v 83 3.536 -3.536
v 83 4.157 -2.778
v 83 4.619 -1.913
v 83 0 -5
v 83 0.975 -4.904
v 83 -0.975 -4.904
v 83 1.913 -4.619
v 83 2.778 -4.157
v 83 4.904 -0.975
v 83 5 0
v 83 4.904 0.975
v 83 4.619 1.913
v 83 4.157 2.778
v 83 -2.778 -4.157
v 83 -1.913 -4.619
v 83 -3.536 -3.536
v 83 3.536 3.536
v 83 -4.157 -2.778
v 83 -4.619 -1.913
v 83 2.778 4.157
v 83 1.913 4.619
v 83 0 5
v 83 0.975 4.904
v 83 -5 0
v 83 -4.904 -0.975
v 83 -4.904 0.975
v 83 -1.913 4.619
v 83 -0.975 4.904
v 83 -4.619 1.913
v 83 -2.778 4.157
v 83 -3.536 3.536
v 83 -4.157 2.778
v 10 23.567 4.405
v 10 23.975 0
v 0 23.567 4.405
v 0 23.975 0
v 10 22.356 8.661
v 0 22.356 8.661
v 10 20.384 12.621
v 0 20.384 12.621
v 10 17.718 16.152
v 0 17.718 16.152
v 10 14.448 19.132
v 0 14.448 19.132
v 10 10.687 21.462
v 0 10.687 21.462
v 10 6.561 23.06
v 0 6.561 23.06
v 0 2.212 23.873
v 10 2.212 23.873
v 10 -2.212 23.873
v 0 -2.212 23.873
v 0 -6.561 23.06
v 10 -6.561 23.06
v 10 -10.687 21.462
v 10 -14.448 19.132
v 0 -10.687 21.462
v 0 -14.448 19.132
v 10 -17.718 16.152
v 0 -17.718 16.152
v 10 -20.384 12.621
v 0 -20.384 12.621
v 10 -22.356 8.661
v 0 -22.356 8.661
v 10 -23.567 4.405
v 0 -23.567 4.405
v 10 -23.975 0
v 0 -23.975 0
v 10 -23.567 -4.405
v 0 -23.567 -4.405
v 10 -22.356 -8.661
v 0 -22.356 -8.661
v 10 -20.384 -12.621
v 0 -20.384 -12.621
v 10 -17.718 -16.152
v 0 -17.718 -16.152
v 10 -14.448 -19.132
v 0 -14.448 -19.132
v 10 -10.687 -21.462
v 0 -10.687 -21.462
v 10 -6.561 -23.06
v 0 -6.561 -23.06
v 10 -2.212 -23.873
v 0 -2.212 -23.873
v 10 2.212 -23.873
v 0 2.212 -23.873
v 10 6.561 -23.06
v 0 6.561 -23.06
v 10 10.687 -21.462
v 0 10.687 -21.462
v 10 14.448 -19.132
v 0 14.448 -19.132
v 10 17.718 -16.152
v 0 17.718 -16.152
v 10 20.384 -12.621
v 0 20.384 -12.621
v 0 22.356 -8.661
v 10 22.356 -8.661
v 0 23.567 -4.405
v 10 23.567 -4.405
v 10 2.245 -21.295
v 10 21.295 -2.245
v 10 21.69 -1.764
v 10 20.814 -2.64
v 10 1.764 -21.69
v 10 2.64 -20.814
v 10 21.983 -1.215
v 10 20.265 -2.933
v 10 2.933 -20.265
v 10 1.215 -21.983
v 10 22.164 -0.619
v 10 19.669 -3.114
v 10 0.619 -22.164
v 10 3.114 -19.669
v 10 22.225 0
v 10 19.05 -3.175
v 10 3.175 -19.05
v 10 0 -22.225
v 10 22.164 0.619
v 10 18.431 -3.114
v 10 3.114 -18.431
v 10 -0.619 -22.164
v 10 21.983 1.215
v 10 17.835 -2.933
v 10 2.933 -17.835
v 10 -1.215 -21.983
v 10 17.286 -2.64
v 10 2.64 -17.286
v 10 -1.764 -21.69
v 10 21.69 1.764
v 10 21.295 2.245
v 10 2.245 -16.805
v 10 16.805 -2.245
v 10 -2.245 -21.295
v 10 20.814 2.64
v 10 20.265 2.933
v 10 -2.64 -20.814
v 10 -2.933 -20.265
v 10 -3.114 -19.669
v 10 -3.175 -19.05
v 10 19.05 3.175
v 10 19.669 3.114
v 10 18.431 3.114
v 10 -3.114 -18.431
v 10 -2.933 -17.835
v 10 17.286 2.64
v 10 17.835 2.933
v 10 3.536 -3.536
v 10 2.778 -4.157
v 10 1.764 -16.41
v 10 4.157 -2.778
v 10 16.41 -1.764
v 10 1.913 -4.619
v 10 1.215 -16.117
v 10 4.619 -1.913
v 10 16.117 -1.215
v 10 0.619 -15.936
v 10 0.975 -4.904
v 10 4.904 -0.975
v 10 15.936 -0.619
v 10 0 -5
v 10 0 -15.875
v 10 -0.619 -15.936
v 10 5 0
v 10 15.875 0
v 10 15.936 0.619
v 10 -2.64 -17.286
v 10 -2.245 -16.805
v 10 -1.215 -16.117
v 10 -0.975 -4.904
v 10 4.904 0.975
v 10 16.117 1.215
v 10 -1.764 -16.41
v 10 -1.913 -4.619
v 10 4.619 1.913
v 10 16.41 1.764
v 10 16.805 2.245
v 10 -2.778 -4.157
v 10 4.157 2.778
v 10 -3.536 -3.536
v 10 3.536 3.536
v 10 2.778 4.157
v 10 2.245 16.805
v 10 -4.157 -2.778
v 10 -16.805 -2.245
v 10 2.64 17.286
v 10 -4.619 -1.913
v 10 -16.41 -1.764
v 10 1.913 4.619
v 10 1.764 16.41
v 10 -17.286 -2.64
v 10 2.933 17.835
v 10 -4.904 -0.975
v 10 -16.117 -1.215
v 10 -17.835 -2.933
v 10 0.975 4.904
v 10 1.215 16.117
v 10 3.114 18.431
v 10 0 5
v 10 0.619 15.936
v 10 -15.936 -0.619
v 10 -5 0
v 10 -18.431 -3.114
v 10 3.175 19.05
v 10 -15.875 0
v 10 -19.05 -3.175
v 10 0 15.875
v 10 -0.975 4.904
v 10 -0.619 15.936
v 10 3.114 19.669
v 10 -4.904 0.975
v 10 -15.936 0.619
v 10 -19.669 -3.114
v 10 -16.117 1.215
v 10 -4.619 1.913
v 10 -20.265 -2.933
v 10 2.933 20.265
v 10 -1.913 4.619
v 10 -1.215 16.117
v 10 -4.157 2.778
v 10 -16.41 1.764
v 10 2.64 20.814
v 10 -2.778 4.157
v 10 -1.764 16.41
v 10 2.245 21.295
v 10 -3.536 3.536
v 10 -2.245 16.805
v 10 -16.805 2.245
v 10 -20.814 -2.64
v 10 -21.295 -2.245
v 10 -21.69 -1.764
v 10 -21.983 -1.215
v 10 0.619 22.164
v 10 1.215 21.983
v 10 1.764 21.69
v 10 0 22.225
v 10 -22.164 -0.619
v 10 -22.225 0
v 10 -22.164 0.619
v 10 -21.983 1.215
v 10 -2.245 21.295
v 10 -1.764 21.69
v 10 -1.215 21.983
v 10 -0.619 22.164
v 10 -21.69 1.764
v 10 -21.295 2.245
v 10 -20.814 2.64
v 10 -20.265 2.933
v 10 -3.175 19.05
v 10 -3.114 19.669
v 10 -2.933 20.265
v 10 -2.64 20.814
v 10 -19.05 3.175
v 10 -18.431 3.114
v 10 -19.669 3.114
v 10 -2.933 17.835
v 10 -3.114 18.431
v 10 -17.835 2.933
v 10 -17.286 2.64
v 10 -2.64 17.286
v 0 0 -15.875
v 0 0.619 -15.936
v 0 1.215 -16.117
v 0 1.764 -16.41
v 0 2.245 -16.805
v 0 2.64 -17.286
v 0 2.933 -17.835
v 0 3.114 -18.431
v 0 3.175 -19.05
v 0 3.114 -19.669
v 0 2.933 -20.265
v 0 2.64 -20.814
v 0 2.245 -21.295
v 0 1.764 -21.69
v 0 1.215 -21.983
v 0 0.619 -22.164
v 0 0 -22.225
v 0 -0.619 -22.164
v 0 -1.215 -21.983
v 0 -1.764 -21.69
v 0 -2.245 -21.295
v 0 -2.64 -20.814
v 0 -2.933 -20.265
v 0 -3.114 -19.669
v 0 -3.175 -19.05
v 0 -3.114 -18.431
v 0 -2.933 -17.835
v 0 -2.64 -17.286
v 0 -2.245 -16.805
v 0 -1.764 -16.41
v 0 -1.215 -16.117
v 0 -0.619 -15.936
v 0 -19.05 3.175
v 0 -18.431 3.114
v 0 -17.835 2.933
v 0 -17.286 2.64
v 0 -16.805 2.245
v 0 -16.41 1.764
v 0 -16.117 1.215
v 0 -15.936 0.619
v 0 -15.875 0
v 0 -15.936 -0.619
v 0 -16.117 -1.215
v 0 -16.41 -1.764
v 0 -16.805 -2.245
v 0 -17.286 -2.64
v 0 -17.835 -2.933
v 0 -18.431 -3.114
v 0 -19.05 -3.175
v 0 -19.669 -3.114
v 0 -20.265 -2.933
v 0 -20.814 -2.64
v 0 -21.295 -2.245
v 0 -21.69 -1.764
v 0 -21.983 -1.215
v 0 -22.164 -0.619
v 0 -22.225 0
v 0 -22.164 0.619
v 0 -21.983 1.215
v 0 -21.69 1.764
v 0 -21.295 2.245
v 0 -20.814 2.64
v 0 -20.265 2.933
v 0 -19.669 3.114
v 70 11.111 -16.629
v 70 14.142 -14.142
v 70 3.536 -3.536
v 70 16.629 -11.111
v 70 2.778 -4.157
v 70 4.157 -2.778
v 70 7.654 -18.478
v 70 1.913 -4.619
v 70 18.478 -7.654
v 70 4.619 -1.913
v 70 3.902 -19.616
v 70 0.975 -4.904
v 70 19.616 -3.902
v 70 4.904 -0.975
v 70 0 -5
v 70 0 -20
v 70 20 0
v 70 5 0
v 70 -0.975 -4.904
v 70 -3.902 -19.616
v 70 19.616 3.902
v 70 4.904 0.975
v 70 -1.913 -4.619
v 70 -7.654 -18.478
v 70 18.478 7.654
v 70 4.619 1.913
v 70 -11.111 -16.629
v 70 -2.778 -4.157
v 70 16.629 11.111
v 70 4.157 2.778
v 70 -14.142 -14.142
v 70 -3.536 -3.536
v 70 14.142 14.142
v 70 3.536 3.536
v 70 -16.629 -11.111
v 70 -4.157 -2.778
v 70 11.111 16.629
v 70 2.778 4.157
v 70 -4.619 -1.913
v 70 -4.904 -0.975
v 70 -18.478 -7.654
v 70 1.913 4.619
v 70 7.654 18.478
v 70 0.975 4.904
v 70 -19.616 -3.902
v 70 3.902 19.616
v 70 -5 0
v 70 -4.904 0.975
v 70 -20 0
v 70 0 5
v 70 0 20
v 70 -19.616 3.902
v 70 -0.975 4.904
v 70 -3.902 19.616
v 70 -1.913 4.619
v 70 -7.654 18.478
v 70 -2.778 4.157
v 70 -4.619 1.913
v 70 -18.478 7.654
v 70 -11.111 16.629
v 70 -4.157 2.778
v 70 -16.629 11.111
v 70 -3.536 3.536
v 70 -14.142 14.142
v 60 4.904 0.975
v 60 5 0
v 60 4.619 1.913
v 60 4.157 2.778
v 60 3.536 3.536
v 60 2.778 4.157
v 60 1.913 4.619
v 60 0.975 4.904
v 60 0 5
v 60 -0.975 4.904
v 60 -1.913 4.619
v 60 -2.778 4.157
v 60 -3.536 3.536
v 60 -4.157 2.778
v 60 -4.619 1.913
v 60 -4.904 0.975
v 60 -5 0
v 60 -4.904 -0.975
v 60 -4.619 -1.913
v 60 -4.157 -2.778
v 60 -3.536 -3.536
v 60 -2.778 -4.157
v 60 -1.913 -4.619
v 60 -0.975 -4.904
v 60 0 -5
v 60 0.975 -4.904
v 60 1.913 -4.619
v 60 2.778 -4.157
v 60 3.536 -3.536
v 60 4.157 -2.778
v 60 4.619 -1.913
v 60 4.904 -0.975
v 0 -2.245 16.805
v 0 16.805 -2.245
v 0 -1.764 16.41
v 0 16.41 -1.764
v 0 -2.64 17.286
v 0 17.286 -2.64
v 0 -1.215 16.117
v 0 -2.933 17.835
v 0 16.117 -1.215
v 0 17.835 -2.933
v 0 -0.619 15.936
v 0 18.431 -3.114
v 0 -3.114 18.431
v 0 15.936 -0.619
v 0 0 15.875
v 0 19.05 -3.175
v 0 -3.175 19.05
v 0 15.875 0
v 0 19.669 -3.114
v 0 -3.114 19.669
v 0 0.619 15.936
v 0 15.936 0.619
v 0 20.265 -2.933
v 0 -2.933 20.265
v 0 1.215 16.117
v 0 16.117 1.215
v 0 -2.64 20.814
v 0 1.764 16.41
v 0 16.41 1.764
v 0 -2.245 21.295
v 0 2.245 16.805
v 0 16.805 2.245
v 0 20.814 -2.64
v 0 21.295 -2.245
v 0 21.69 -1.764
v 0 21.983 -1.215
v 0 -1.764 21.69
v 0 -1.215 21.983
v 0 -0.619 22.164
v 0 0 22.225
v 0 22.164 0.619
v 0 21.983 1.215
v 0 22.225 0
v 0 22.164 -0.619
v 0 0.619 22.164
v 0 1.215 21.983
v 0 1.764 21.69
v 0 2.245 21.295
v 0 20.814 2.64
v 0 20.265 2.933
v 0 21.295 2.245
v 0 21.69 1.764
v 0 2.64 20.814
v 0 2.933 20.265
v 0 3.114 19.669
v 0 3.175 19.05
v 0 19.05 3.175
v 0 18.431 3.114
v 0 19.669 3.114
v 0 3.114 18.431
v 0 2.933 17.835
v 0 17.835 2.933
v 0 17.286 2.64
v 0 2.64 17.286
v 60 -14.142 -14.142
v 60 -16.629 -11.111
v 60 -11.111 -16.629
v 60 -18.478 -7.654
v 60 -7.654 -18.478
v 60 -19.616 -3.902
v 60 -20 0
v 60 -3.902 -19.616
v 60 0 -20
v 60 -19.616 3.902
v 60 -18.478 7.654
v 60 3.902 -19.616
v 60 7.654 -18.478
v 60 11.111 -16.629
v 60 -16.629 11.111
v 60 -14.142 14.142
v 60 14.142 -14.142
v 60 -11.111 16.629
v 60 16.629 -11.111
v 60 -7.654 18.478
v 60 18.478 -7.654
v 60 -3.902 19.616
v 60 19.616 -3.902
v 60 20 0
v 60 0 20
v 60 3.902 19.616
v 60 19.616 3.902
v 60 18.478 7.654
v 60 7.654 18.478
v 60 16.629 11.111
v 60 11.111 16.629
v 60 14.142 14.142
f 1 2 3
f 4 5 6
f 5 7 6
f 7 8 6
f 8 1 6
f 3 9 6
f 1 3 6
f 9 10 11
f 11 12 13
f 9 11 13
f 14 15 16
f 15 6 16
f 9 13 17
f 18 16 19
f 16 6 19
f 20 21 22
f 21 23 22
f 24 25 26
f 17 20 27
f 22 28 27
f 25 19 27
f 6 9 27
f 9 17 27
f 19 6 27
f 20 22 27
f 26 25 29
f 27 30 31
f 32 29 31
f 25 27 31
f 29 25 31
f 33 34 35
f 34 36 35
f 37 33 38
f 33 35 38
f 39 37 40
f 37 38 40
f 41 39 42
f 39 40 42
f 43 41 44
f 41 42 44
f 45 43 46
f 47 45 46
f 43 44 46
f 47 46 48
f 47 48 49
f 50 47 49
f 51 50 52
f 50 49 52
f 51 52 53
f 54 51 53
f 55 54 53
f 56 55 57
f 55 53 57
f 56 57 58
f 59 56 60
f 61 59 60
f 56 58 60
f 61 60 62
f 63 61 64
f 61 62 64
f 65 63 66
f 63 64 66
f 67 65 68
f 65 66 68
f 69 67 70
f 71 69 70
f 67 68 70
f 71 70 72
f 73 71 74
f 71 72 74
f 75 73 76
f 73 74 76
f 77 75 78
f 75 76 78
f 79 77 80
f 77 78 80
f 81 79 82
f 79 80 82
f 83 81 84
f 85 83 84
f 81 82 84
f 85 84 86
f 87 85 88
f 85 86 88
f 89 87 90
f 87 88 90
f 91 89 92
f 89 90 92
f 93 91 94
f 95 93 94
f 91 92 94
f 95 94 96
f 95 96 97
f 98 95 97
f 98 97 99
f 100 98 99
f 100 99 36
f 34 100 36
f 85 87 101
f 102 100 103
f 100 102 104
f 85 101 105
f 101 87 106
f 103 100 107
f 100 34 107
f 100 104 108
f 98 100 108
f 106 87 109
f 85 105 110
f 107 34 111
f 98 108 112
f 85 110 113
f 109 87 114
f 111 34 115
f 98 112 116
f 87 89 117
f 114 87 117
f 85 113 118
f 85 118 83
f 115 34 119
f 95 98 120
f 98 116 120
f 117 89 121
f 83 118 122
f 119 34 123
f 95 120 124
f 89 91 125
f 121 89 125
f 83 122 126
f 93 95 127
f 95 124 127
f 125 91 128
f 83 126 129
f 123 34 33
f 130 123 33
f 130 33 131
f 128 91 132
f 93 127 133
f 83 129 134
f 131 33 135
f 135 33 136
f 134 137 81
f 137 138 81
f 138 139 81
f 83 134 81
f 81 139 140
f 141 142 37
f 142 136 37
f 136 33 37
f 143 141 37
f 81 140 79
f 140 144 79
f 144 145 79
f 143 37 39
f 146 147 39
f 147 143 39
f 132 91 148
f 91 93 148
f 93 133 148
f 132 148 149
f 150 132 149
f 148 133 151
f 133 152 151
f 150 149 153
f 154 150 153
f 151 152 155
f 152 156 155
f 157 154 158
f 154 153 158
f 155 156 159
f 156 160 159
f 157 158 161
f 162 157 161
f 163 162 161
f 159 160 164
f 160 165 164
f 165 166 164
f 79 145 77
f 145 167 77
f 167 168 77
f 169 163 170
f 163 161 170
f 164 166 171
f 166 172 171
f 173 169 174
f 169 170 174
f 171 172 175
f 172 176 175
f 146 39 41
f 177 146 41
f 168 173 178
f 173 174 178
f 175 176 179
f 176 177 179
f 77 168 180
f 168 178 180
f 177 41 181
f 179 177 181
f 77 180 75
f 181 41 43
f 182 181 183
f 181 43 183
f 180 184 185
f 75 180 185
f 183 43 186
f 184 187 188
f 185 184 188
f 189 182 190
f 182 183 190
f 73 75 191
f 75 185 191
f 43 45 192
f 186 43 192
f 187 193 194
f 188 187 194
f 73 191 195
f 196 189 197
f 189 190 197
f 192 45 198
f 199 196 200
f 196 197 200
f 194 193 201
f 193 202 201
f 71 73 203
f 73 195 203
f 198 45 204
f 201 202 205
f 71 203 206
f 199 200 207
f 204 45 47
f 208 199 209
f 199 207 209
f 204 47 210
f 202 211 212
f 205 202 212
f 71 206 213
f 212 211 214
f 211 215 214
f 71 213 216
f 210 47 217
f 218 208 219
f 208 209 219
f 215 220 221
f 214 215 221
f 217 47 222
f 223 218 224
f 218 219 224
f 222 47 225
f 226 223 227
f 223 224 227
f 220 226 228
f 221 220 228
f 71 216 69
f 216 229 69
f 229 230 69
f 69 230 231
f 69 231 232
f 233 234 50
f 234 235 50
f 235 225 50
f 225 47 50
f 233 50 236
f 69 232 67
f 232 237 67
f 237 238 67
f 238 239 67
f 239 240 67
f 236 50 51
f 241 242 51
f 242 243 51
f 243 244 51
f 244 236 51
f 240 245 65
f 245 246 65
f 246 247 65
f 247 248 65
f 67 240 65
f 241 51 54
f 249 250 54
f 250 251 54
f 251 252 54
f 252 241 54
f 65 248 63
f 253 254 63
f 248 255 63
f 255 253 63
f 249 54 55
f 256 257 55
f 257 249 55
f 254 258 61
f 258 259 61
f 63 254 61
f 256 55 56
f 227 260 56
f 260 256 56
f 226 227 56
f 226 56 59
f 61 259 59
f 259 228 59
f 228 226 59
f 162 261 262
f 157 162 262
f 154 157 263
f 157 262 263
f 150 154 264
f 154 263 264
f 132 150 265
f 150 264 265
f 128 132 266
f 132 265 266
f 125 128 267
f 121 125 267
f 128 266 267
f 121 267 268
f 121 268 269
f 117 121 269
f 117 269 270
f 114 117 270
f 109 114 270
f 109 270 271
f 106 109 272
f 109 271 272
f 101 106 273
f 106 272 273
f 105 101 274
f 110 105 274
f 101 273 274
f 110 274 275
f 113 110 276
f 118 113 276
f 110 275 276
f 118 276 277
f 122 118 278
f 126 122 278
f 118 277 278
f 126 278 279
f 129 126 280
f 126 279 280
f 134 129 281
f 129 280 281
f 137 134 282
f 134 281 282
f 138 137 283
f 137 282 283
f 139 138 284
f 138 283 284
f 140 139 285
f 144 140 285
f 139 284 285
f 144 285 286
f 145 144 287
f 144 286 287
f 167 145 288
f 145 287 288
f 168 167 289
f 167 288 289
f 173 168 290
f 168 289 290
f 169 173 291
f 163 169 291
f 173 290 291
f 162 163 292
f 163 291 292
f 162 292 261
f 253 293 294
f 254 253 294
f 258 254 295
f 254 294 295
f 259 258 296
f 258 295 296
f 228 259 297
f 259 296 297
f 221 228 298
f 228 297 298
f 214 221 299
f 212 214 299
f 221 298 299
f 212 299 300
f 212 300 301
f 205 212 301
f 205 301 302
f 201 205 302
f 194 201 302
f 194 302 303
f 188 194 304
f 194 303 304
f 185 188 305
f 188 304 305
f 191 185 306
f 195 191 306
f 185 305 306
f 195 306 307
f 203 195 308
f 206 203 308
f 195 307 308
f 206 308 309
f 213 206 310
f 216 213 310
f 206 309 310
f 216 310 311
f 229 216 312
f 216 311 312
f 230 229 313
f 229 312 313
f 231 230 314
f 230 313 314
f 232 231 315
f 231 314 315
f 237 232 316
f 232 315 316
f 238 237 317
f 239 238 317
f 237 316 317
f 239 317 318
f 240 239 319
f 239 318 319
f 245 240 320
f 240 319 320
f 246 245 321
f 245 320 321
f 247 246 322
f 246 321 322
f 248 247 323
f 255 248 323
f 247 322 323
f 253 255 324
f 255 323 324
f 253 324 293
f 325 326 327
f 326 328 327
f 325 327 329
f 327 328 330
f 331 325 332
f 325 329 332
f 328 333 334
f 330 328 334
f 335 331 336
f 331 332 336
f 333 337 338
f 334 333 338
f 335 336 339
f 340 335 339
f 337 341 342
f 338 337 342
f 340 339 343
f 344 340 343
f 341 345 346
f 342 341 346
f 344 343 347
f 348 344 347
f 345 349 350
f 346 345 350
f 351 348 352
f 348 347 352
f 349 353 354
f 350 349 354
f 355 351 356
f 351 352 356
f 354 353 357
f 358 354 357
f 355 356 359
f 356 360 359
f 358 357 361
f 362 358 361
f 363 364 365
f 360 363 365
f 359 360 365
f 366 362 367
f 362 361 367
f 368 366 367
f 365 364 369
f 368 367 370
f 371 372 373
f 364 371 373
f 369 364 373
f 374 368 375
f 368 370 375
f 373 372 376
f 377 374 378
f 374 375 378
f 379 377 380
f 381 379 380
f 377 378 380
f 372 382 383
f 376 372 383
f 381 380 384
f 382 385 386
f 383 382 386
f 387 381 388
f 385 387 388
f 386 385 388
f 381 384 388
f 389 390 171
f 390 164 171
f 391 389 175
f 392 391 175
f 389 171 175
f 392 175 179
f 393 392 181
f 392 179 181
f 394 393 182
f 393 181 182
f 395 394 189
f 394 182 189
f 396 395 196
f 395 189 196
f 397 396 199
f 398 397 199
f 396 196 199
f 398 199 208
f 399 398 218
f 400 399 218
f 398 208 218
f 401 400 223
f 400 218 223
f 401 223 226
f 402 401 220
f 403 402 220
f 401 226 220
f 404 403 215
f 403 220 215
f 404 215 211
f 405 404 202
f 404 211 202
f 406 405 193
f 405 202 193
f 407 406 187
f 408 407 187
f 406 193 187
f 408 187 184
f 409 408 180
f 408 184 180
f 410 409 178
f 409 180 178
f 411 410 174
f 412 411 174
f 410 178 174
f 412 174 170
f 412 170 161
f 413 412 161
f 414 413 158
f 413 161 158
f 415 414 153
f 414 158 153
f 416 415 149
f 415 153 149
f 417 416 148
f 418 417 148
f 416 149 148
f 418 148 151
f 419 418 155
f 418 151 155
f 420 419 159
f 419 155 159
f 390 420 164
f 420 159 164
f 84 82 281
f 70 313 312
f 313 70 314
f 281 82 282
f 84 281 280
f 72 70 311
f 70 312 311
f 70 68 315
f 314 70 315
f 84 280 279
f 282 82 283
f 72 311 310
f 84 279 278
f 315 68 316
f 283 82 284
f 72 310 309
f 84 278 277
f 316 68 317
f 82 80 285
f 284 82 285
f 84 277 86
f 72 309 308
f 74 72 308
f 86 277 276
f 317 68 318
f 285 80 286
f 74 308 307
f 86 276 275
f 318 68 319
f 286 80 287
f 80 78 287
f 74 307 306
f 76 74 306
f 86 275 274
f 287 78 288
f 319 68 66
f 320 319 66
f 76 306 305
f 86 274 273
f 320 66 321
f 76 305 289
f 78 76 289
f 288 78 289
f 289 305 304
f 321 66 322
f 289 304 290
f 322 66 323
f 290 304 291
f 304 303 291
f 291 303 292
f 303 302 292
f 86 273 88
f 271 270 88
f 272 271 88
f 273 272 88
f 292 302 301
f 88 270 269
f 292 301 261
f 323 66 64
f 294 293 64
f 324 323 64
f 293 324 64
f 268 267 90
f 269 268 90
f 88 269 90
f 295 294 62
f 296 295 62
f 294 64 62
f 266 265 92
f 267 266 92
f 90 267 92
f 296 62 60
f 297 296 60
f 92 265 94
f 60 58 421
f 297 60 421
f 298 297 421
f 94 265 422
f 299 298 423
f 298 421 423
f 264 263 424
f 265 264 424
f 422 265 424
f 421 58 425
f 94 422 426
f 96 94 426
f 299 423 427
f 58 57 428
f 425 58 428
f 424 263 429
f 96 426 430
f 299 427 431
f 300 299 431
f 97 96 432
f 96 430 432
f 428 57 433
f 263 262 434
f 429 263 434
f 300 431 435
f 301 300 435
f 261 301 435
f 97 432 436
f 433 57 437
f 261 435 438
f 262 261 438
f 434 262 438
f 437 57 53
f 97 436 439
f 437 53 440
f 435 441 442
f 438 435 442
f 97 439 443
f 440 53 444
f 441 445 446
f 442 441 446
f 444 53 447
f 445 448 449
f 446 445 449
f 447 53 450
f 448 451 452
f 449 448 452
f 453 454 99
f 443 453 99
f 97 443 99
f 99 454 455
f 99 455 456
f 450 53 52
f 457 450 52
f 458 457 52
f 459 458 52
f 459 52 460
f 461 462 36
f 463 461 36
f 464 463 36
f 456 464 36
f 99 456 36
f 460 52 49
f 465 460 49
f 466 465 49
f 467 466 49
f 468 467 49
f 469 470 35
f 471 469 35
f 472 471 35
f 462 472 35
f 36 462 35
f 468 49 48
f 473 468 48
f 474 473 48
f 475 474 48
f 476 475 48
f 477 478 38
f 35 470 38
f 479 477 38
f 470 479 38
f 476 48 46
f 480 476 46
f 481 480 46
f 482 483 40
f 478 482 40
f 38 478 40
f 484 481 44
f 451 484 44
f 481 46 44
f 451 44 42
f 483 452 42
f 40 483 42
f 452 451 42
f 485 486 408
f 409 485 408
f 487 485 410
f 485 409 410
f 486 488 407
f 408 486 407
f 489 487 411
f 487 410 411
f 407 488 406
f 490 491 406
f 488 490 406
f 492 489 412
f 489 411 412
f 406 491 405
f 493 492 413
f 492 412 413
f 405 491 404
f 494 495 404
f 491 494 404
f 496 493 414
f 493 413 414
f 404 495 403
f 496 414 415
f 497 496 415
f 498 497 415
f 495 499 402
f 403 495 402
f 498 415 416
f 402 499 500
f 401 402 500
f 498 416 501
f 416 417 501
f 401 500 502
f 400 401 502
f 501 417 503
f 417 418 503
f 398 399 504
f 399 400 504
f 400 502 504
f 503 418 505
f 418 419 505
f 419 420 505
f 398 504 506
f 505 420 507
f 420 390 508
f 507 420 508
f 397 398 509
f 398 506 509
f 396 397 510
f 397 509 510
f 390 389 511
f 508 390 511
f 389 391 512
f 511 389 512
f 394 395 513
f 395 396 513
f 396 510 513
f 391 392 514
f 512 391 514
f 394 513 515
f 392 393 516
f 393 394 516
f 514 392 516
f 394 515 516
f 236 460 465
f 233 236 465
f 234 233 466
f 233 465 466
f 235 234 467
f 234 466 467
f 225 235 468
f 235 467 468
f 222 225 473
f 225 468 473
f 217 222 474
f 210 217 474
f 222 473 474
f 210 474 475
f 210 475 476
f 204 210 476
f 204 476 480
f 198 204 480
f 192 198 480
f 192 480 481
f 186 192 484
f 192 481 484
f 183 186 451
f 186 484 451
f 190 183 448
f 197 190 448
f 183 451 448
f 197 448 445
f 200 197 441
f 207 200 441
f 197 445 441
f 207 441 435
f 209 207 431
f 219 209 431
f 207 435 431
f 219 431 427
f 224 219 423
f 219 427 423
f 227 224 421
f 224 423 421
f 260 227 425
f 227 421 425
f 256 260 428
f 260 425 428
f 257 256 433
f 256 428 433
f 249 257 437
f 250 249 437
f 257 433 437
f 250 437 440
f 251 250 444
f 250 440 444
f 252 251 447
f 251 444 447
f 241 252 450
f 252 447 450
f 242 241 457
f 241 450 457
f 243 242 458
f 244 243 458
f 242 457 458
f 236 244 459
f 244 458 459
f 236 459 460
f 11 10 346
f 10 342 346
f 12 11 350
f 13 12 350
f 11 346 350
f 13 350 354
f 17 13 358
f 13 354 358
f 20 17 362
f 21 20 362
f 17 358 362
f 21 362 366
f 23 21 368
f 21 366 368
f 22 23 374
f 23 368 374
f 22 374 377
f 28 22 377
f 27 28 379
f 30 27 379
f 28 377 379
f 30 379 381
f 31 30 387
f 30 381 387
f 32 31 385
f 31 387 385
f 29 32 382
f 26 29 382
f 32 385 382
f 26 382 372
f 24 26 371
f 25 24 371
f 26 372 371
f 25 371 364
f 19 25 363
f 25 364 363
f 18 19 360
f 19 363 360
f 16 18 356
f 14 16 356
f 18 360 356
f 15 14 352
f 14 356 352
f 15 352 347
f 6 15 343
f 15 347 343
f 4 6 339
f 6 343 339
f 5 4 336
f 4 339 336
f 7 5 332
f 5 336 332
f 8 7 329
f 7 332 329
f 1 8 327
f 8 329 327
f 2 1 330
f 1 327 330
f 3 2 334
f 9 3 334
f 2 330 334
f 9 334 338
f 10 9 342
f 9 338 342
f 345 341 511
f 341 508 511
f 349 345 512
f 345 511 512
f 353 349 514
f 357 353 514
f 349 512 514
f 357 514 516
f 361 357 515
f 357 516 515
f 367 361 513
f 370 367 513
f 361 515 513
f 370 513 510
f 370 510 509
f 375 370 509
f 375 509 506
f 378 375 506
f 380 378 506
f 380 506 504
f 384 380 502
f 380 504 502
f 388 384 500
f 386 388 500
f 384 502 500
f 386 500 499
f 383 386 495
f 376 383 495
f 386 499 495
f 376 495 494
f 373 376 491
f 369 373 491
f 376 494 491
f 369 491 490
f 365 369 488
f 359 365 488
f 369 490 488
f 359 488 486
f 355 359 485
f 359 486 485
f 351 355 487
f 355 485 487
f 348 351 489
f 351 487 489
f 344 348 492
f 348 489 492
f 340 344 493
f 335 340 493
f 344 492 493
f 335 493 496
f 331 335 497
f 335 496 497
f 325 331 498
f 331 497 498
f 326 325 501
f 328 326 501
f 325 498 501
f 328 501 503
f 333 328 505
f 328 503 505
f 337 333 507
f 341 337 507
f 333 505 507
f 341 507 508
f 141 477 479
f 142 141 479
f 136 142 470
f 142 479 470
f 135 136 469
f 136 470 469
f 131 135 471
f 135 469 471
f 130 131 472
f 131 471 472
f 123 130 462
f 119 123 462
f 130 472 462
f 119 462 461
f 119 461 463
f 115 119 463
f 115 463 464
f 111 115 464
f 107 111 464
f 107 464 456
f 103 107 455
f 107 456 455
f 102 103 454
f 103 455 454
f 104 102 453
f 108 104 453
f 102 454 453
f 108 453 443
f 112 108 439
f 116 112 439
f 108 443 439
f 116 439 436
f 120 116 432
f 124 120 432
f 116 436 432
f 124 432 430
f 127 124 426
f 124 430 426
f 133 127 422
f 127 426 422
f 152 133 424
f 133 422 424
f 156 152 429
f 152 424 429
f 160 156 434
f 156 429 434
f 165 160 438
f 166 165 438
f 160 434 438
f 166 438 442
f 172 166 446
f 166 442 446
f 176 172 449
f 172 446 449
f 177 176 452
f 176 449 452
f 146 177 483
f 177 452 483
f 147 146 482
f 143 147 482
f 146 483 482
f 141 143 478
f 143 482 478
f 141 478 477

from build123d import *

# Parameters (mm, degrees)
SKETCH3_R          = 3.175
CUT_EXTRUDE1_DEPTH = 10


with BuildPart() as part:
    # Sketch1 → Revolve1 (revolve)
    with BuildSketch(Plane.XY):
        Polygon((83, 5), (70, 5), (70, 20), (60, 20), (60, 5), (10, 5), (10, 23.975), (0, 23.975), (0, 0), (83, 0), align=None)
    revolve(axis=Axis((0, 0, 0), (1, 0, 0)))

    # Sketch3 → Cut-Extrude1 (cut)
    with BuildSketch(Plane.ZY):
        with Locations((0, 19.05)):
            Circle(SKETCH3_R)
        with Locations((19.05, 0)):
            Circle(SKETCH3_R)
        with Locations((0, -19.05)):
            Circle(SKETCH3_R)
        with Locations((-19.05, 0)):
            Circle(SKETCH3_R)
    extrude(amount=-CUT_EXTRUDE1_DEPTH, mode=Mode.SUBTRACT)


solid = part.part
